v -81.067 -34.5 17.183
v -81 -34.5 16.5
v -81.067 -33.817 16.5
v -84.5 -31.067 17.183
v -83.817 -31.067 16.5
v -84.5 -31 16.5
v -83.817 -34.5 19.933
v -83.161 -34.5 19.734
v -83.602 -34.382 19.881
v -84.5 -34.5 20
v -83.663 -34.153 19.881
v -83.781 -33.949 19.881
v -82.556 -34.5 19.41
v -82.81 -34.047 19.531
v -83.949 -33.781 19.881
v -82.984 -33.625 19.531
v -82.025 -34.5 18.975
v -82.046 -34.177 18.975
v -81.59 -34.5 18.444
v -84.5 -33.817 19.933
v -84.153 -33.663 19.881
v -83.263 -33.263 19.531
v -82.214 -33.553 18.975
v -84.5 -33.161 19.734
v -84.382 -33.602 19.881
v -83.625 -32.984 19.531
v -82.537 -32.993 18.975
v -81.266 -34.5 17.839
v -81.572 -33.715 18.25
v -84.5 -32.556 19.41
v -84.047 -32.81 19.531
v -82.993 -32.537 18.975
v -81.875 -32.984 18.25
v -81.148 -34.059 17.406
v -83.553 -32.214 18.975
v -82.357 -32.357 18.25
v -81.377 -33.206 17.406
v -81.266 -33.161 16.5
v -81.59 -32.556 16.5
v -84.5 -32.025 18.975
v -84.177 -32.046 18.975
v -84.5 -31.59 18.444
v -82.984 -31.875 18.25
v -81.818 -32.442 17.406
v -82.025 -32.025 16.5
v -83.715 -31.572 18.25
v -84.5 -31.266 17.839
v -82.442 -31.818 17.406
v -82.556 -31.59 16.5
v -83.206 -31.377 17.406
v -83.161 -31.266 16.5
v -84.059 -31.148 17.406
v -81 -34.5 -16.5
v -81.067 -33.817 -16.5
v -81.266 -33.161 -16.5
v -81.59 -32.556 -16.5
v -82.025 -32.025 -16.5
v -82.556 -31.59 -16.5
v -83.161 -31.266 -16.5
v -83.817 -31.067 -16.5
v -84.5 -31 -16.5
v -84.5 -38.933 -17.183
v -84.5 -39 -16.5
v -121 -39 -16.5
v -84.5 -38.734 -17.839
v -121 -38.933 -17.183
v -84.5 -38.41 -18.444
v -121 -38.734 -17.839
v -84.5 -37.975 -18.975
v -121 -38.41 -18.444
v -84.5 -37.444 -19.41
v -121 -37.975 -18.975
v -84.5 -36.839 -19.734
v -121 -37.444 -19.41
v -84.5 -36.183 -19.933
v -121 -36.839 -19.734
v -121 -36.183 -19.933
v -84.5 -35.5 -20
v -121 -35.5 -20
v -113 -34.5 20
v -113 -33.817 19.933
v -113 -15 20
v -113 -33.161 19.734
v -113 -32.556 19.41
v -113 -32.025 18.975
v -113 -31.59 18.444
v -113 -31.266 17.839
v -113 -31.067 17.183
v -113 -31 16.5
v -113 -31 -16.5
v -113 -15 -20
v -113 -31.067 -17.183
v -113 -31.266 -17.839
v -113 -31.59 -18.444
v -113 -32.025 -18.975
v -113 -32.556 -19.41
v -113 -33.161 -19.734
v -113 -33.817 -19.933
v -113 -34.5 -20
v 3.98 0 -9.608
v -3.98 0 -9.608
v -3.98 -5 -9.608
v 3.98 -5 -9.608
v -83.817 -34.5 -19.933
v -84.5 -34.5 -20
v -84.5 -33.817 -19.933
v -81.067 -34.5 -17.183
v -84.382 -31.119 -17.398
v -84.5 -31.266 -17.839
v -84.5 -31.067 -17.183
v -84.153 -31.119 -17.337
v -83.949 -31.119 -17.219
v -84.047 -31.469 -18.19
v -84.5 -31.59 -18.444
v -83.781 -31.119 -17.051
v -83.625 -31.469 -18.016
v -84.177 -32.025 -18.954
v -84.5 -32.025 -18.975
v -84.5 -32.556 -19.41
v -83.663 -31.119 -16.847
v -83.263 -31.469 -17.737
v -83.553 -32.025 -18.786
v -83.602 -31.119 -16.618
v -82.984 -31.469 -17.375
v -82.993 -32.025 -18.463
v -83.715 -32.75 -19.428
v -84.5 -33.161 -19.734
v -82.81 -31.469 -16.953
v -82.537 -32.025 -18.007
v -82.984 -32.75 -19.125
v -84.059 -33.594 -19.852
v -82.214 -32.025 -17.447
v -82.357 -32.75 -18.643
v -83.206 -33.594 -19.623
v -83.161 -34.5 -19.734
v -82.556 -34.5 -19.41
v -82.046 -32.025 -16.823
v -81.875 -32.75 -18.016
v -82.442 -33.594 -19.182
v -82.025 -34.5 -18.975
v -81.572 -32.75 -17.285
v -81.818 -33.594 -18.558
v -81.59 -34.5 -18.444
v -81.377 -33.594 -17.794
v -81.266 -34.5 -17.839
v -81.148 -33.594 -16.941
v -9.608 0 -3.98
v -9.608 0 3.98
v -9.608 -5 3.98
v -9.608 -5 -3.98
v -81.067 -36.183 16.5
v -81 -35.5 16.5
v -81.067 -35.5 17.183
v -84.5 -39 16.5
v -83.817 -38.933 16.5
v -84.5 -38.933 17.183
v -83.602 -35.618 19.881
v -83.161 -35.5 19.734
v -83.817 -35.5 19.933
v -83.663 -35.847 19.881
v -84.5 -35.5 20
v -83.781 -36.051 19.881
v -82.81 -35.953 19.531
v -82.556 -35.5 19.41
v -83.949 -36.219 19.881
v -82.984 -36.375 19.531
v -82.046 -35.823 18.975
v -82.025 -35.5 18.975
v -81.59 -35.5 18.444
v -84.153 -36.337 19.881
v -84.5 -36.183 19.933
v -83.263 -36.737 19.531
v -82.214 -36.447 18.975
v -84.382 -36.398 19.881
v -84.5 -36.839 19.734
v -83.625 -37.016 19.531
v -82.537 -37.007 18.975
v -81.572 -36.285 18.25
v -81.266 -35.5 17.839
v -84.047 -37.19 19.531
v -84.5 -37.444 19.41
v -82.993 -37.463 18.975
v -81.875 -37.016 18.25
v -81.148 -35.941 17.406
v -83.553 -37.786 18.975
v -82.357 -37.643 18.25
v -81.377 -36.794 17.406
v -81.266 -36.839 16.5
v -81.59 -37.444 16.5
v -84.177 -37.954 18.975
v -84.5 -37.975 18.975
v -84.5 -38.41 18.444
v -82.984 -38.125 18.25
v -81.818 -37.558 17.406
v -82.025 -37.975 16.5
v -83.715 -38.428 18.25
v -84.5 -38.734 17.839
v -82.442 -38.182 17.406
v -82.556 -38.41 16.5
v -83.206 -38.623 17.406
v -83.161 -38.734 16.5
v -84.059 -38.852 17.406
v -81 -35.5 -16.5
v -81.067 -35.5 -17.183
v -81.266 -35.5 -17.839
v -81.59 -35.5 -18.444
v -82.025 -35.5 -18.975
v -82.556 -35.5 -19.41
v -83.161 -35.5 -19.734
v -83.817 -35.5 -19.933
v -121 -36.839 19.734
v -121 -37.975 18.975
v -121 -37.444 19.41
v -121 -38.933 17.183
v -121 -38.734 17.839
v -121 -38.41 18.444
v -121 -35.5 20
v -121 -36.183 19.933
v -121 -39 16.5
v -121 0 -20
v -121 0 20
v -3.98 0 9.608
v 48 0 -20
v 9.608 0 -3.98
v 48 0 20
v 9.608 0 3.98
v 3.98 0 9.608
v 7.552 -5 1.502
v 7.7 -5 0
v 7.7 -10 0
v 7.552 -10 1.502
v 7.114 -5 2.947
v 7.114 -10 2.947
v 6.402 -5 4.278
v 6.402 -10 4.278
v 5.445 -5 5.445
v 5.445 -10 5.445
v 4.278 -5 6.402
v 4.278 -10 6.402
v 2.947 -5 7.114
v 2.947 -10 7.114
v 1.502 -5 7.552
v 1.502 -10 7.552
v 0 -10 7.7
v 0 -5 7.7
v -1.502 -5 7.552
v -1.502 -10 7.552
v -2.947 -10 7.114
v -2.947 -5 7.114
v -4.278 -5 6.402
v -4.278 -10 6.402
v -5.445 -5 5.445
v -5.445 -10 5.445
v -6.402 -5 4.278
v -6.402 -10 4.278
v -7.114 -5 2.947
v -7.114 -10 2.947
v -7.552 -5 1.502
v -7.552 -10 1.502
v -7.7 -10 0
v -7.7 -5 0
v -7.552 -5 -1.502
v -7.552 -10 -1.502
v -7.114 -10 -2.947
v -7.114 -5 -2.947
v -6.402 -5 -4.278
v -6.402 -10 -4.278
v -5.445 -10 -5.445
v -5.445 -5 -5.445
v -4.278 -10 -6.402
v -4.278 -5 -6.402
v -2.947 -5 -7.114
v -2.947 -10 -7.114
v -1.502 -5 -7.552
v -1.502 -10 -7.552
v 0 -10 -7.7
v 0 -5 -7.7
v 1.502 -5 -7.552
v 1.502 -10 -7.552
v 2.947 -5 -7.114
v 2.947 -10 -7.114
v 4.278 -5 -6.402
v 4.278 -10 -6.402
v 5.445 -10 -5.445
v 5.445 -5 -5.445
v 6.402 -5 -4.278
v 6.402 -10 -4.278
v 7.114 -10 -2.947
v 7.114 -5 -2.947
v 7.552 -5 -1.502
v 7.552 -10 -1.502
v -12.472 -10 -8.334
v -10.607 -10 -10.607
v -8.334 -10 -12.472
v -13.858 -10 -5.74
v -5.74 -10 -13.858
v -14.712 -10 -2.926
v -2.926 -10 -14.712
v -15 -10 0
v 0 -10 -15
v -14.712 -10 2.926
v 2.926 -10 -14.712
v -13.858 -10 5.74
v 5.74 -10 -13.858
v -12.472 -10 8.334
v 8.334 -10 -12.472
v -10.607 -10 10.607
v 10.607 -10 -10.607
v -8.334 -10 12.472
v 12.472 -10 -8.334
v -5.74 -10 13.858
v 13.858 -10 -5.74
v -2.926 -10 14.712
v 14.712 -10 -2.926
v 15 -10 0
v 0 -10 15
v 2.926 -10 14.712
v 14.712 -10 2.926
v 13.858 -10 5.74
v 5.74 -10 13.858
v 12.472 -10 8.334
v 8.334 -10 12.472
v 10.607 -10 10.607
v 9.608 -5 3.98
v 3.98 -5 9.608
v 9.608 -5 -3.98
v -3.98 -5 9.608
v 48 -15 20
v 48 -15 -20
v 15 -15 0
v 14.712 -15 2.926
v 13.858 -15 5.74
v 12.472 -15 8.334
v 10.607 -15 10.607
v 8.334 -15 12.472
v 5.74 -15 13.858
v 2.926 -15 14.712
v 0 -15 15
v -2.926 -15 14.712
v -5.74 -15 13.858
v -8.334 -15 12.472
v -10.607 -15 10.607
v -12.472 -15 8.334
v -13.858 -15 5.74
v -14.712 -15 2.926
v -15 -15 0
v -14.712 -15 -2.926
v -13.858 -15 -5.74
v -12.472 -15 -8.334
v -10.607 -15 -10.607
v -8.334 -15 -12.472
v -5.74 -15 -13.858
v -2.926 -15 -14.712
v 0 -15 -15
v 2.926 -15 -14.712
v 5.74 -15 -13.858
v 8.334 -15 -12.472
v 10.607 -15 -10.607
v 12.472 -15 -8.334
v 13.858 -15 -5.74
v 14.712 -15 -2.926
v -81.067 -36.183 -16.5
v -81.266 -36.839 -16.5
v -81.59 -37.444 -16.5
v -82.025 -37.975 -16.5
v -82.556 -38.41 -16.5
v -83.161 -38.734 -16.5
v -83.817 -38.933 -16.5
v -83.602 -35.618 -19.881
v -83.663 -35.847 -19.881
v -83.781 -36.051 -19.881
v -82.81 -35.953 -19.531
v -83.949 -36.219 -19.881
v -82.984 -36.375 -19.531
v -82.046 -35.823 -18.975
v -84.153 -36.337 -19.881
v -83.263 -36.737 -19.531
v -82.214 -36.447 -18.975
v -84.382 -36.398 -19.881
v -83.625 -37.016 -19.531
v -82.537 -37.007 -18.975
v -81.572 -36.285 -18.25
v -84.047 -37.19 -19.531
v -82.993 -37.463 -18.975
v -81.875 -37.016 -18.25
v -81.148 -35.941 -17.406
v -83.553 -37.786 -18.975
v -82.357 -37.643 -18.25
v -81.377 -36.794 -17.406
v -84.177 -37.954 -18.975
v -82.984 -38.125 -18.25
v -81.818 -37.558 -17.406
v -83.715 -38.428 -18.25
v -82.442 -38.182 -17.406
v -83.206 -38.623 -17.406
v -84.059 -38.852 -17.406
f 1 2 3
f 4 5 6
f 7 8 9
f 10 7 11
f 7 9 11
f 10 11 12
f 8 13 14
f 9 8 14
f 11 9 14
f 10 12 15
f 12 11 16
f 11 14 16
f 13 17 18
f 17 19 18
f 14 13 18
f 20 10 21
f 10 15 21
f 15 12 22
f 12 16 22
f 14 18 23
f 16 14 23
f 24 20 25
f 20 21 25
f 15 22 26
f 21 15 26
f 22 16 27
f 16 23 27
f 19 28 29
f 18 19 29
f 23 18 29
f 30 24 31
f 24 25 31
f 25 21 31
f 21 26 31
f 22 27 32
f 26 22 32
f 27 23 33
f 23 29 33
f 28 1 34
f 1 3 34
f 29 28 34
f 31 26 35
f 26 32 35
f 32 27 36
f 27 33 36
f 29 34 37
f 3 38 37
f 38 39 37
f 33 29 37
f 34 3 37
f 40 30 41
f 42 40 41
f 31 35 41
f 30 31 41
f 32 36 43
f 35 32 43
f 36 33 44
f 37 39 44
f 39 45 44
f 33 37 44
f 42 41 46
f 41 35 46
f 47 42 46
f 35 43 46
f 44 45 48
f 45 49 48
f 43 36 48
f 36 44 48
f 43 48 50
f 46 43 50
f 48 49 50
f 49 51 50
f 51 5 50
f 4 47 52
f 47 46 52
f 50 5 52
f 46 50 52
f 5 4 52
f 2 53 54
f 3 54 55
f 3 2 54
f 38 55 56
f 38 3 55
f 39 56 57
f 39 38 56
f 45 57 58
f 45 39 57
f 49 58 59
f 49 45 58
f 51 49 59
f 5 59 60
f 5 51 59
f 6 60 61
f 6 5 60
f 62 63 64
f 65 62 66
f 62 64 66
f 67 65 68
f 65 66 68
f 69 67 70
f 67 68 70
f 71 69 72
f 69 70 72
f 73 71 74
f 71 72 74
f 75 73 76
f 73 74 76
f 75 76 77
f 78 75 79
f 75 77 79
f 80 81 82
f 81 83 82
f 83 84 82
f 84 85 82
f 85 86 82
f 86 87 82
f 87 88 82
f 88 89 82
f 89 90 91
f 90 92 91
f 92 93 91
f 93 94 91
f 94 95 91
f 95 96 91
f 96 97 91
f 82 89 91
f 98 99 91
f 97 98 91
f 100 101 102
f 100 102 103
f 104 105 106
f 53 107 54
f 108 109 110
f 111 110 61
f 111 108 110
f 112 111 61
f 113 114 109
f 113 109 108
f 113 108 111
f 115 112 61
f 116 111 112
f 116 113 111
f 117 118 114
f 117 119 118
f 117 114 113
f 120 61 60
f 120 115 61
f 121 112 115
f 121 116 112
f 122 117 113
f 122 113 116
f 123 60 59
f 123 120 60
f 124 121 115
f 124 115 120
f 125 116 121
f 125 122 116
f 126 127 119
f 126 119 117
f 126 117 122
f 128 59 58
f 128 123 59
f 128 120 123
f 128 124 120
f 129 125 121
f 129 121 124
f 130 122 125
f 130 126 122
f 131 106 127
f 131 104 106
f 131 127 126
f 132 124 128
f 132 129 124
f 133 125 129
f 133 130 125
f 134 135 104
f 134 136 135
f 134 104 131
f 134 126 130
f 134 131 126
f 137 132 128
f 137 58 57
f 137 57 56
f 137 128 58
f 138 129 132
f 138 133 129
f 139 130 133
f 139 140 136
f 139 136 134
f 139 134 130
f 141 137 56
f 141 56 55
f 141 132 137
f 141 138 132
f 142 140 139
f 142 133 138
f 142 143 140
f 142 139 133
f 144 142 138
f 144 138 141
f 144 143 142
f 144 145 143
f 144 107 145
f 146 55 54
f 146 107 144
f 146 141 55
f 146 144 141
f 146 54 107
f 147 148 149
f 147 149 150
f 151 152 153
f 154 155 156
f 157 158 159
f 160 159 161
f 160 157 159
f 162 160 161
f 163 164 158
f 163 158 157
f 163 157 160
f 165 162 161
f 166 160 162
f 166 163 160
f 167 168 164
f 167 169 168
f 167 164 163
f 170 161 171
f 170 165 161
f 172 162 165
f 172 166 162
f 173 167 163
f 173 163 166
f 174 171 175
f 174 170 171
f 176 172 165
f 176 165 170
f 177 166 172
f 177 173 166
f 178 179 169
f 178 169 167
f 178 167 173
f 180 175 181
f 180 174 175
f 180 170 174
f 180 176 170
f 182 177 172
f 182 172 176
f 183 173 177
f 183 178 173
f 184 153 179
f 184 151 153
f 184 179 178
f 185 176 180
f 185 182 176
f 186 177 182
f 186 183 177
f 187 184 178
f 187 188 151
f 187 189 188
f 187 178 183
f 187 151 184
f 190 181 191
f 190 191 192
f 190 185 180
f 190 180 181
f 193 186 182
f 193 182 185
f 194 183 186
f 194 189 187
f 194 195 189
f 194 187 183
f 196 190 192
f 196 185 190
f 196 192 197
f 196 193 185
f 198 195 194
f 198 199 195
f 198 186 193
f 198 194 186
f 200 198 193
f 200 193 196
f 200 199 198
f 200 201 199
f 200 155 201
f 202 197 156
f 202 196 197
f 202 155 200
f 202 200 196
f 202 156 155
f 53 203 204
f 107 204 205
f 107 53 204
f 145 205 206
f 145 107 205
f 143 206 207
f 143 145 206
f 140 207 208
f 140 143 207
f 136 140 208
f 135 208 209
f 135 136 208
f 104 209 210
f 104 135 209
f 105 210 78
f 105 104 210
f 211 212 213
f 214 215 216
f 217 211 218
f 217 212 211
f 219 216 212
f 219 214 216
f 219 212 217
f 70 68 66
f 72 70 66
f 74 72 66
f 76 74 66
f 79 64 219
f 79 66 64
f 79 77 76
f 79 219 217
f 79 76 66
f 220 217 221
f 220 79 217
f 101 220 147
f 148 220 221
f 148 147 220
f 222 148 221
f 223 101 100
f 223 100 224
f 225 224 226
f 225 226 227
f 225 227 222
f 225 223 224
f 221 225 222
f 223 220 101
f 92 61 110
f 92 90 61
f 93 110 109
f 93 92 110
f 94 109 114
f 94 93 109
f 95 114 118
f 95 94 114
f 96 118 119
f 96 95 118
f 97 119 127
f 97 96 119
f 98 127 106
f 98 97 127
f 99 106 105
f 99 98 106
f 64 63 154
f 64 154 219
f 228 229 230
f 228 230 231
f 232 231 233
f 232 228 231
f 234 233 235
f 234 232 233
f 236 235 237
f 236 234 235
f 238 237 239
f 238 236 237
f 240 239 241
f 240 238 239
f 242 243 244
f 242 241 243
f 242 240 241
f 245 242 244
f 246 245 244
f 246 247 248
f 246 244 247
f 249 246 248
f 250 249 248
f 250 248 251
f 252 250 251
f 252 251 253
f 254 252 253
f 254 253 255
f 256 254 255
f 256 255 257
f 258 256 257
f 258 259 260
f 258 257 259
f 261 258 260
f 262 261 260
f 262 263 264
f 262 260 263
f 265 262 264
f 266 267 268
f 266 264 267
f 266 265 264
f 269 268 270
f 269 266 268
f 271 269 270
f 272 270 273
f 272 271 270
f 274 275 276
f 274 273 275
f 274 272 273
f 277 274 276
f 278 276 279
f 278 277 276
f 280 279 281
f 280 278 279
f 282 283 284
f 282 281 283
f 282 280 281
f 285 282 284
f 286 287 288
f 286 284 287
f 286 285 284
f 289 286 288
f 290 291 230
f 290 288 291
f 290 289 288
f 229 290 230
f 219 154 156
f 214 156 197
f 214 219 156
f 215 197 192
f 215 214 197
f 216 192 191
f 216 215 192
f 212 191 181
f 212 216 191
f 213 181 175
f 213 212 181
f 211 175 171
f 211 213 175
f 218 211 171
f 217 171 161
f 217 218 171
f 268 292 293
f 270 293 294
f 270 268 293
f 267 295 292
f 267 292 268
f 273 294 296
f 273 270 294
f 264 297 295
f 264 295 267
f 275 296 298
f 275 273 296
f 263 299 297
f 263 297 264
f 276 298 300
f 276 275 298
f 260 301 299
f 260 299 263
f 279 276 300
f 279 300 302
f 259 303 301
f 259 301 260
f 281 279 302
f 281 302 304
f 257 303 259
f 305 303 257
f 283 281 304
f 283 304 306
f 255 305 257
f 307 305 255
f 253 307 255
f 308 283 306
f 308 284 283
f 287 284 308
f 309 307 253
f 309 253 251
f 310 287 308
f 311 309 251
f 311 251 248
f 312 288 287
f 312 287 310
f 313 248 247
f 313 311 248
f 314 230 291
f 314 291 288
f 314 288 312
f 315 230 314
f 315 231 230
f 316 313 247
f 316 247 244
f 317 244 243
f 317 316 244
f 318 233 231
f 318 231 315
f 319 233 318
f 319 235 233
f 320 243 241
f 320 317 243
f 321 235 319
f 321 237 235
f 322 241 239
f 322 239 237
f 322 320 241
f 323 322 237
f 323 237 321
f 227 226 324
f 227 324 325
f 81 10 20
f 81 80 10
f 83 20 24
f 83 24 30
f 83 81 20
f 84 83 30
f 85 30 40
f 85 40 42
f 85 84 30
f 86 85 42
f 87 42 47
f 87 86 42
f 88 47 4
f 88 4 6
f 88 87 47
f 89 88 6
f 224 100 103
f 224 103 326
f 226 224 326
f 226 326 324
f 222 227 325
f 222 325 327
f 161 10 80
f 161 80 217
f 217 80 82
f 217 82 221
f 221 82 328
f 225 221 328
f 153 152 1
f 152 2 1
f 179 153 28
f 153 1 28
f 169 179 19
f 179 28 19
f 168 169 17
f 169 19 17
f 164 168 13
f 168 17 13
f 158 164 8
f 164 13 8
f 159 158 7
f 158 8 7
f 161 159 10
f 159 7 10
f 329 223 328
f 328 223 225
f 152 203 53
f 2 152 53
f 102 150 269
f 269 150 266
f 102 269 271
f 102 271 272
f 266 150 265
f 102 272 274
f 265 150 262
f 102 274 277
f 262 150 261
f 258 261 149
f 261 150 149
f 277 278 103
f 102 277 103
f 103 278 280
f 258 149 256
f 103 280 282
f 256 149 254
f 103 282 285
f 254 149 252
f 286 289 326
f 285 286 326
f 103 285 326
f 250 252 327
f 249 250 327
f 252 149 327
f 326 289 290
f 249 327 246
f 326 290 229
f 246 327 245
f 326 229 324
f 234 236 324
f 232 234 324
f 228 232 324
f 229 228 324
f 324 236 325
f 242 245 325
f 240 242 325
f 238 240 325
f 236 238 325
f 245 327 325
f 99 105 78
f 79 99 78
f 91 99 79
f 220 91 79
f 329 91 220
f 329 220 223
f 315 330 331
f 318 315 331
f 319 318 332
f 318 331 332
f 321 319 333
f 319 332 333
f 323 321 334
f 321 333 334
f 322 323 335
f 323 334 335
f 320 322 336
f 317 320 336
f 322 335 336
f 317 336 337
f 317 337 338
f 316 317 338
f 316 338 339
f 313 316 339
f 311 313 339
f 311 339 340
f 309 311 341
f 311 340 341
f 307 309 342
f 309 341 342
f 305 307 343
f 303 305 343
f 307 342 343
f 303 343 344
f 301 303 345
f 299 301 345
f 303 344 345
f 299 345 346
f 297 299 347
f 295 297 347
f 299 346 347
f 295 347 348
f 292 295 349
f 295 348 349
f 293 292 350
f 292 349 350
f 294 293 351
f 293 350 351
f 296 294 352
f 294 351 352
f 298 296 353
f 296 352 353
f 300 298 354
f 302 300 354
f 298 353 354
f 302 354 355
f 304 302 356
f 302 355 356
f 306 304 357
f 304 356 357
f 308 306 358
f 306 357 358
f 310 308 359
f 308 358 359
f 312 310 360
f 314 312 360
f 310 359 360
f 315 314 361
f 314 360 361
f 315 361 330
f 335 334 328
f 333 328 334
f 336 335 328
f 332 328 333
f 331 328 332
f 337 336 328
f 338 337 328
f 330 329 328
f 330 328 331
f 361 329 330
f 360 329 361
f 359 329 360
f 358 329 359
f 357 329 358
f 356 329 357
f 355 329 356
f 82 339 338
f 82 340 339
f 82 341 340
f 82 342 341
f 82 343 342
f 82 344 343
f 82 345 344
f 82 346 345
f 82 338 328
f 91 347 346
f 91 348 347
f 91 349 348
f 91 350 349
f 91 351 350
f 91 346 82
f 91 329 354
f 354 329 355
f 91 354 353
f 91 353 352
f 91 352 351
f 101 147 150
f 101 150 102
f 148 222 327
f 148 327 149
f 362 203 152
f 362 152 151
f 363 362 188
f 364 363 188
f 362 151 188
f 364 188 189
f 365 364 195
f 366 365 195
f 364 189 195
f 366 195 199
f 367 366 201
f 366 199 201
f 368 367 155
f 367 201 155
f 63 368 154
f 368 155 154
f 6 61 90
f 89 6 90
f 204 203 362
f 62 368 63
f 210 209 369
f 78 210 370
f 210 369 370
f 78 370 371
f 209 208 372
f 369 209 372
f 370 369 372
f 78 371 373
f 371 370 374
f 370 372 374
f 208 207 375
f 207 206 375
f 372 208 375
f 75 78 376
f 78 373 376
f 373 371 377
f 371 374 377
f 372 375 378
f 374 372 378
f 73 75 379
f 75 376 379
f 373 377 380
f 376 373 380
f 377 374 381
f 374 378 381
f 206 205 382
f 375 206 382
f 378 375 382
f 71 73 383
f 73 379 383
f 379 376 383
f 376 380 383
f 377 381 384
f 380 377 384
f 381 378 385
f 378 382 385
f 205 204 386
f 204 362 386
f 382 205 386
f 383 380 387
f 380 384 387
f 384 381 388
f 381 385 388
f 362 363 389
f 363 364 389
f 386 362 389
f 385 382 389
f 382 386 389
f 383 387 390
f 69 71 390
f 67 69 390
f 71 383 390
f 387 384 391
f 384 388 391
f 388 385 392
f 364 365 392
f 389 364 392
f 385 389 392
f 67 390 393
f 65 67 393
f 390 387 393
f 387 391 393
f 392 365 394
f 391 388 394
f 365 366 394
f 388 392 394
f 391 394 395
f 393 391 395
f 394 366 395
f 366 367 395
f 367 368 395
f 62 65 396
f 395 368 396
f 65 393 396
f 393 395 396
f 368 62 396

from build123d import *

# Parameters (mm, degrees)
SKETCH076_W             = 40
SKETCH076_H             = 15
PAD026_DEPTH            = 50
SKETCH078_W             = 40
SKETCH078_H             = 24
PAD027_DEPTH            = 40
SKETCH079_W             = 32
SKETCH079_H             = 16
POCKET046_DEPTH         = 40.001
FILLET010_R             = 3.5
BODY011_ROLL_ANGLE      = 90
BODY011_PLACEMENT_ANGLE = 180
SKETCH057_W             = 120
SKETCH057_H             = 40
PAD021_DEPTH            = 15
SKETCH058_R             = 15
POCKET034_DEPTH         = 5
POCKET035_DEPTH         = 5
SKETCH060_R             = 7.7
POCKET036_DEPTH         = 15.001


with BuildPart() as extensionb:
    # Sketch076 → Pad026 (new body)
    with BuildSketch(Plane.YZ):
        with Locations((20, 7.5)):
            Rectangle(SKETCH076_W, SKETCH076_H)
    extrude(amount=PAD026_DEPTH)

    # Sketch078 → Pad027 (join)
    with BuildSketch(Plane.XZ):
        with Locations((30, -12)):
            Rectangle(SKETCH078_W, SKETCH078_H)
    extrude(amount=-PAD027_DEPTH)

    # Sketch079 → Pocket046 (cut, through all)
    with BuildSketch(Plane.XZ):
        with Locations((26, -8)):
            Rectangle(SKETCH079_W, SKETCH079_H)
    extrude(amount=-POCKET046_DEPTH, mode=Mode.SUBTRACT)

    # Fillet010
    fillet010_edges = [extensionb.edges().sort_by_distance(p)[0] for p in [
        (10, 20, -24),
        (10, 0, -20),
        (26, 0, -16),
        (30, 0, -24),
        (10, 20, -16),
        (10, 40, -20),
        (30, 40, -24),
        (26, 40, -16),
    ]]
    fillet(fillet010_edges, radius=FILLET010_R)


with BuildPart() as extensionb_1:
    # Body011 roll: moved
    add(extensionb.part.rotate(Axis((0, 0, 0), (1, 0, 0)), BODY011_ROLL_ANGLE))


with BuildPart() as extensionb_2:
    # Body011 placement: moved
    add(extensionb_1.part.moved(Location((-71, -15, -20))).rotate(Axis((-71, -15, -20), (0, 0, 1)), BODY011_PLACEMENT_ANGLE))


with BuildPart() as bracket_b:
    # Sketch057 → Pad021 (new body)
    with BuildSketch(Plane.XZ):
        with Locations((-12, 0)):
            Rectangle(SKETCH057_W, SKETCH057_H)
    extrude(amount=PAD021_DEPTH)

    # Sketch058 (on Face6 of Pad021) → Pocket034 (cut)
    with BuildSketch(Plane.XZ.offset(15)):
        Circle(SKETCH058_R)
    extrude(amount=-POCKET034_DEPTH, mode=Mode.SUBTRACT)

    # Sketch059 → Pocket035 (cut)
    with BuildSketch(Plane.XZ):
        Polygon((9.608347, 3.979908), (3.979908, 9.608347), (-3.979908, 9.608347), (-9.608347, 3.979908), (-9.608347, -3.979908), (-3.979908, -9.608347), (3.979908, -9.608347), (9.608347, -3.979908), align=None)
    extrude(amount=POCKET035_DEPTH, mode=Mode.SUBTRACT)

    # Sketch060 → Pocket036 (cut, through all)
    with BuildSketch(Plane.XZ):
        Circle(SKETCH060_R)
    extrude(amount=POCKET036_DEPTH, mode=Mode.SUBTRACT)

    # Boolean: union extensionB
    add(extensionb_2.part)


solid = bracket_b.part
